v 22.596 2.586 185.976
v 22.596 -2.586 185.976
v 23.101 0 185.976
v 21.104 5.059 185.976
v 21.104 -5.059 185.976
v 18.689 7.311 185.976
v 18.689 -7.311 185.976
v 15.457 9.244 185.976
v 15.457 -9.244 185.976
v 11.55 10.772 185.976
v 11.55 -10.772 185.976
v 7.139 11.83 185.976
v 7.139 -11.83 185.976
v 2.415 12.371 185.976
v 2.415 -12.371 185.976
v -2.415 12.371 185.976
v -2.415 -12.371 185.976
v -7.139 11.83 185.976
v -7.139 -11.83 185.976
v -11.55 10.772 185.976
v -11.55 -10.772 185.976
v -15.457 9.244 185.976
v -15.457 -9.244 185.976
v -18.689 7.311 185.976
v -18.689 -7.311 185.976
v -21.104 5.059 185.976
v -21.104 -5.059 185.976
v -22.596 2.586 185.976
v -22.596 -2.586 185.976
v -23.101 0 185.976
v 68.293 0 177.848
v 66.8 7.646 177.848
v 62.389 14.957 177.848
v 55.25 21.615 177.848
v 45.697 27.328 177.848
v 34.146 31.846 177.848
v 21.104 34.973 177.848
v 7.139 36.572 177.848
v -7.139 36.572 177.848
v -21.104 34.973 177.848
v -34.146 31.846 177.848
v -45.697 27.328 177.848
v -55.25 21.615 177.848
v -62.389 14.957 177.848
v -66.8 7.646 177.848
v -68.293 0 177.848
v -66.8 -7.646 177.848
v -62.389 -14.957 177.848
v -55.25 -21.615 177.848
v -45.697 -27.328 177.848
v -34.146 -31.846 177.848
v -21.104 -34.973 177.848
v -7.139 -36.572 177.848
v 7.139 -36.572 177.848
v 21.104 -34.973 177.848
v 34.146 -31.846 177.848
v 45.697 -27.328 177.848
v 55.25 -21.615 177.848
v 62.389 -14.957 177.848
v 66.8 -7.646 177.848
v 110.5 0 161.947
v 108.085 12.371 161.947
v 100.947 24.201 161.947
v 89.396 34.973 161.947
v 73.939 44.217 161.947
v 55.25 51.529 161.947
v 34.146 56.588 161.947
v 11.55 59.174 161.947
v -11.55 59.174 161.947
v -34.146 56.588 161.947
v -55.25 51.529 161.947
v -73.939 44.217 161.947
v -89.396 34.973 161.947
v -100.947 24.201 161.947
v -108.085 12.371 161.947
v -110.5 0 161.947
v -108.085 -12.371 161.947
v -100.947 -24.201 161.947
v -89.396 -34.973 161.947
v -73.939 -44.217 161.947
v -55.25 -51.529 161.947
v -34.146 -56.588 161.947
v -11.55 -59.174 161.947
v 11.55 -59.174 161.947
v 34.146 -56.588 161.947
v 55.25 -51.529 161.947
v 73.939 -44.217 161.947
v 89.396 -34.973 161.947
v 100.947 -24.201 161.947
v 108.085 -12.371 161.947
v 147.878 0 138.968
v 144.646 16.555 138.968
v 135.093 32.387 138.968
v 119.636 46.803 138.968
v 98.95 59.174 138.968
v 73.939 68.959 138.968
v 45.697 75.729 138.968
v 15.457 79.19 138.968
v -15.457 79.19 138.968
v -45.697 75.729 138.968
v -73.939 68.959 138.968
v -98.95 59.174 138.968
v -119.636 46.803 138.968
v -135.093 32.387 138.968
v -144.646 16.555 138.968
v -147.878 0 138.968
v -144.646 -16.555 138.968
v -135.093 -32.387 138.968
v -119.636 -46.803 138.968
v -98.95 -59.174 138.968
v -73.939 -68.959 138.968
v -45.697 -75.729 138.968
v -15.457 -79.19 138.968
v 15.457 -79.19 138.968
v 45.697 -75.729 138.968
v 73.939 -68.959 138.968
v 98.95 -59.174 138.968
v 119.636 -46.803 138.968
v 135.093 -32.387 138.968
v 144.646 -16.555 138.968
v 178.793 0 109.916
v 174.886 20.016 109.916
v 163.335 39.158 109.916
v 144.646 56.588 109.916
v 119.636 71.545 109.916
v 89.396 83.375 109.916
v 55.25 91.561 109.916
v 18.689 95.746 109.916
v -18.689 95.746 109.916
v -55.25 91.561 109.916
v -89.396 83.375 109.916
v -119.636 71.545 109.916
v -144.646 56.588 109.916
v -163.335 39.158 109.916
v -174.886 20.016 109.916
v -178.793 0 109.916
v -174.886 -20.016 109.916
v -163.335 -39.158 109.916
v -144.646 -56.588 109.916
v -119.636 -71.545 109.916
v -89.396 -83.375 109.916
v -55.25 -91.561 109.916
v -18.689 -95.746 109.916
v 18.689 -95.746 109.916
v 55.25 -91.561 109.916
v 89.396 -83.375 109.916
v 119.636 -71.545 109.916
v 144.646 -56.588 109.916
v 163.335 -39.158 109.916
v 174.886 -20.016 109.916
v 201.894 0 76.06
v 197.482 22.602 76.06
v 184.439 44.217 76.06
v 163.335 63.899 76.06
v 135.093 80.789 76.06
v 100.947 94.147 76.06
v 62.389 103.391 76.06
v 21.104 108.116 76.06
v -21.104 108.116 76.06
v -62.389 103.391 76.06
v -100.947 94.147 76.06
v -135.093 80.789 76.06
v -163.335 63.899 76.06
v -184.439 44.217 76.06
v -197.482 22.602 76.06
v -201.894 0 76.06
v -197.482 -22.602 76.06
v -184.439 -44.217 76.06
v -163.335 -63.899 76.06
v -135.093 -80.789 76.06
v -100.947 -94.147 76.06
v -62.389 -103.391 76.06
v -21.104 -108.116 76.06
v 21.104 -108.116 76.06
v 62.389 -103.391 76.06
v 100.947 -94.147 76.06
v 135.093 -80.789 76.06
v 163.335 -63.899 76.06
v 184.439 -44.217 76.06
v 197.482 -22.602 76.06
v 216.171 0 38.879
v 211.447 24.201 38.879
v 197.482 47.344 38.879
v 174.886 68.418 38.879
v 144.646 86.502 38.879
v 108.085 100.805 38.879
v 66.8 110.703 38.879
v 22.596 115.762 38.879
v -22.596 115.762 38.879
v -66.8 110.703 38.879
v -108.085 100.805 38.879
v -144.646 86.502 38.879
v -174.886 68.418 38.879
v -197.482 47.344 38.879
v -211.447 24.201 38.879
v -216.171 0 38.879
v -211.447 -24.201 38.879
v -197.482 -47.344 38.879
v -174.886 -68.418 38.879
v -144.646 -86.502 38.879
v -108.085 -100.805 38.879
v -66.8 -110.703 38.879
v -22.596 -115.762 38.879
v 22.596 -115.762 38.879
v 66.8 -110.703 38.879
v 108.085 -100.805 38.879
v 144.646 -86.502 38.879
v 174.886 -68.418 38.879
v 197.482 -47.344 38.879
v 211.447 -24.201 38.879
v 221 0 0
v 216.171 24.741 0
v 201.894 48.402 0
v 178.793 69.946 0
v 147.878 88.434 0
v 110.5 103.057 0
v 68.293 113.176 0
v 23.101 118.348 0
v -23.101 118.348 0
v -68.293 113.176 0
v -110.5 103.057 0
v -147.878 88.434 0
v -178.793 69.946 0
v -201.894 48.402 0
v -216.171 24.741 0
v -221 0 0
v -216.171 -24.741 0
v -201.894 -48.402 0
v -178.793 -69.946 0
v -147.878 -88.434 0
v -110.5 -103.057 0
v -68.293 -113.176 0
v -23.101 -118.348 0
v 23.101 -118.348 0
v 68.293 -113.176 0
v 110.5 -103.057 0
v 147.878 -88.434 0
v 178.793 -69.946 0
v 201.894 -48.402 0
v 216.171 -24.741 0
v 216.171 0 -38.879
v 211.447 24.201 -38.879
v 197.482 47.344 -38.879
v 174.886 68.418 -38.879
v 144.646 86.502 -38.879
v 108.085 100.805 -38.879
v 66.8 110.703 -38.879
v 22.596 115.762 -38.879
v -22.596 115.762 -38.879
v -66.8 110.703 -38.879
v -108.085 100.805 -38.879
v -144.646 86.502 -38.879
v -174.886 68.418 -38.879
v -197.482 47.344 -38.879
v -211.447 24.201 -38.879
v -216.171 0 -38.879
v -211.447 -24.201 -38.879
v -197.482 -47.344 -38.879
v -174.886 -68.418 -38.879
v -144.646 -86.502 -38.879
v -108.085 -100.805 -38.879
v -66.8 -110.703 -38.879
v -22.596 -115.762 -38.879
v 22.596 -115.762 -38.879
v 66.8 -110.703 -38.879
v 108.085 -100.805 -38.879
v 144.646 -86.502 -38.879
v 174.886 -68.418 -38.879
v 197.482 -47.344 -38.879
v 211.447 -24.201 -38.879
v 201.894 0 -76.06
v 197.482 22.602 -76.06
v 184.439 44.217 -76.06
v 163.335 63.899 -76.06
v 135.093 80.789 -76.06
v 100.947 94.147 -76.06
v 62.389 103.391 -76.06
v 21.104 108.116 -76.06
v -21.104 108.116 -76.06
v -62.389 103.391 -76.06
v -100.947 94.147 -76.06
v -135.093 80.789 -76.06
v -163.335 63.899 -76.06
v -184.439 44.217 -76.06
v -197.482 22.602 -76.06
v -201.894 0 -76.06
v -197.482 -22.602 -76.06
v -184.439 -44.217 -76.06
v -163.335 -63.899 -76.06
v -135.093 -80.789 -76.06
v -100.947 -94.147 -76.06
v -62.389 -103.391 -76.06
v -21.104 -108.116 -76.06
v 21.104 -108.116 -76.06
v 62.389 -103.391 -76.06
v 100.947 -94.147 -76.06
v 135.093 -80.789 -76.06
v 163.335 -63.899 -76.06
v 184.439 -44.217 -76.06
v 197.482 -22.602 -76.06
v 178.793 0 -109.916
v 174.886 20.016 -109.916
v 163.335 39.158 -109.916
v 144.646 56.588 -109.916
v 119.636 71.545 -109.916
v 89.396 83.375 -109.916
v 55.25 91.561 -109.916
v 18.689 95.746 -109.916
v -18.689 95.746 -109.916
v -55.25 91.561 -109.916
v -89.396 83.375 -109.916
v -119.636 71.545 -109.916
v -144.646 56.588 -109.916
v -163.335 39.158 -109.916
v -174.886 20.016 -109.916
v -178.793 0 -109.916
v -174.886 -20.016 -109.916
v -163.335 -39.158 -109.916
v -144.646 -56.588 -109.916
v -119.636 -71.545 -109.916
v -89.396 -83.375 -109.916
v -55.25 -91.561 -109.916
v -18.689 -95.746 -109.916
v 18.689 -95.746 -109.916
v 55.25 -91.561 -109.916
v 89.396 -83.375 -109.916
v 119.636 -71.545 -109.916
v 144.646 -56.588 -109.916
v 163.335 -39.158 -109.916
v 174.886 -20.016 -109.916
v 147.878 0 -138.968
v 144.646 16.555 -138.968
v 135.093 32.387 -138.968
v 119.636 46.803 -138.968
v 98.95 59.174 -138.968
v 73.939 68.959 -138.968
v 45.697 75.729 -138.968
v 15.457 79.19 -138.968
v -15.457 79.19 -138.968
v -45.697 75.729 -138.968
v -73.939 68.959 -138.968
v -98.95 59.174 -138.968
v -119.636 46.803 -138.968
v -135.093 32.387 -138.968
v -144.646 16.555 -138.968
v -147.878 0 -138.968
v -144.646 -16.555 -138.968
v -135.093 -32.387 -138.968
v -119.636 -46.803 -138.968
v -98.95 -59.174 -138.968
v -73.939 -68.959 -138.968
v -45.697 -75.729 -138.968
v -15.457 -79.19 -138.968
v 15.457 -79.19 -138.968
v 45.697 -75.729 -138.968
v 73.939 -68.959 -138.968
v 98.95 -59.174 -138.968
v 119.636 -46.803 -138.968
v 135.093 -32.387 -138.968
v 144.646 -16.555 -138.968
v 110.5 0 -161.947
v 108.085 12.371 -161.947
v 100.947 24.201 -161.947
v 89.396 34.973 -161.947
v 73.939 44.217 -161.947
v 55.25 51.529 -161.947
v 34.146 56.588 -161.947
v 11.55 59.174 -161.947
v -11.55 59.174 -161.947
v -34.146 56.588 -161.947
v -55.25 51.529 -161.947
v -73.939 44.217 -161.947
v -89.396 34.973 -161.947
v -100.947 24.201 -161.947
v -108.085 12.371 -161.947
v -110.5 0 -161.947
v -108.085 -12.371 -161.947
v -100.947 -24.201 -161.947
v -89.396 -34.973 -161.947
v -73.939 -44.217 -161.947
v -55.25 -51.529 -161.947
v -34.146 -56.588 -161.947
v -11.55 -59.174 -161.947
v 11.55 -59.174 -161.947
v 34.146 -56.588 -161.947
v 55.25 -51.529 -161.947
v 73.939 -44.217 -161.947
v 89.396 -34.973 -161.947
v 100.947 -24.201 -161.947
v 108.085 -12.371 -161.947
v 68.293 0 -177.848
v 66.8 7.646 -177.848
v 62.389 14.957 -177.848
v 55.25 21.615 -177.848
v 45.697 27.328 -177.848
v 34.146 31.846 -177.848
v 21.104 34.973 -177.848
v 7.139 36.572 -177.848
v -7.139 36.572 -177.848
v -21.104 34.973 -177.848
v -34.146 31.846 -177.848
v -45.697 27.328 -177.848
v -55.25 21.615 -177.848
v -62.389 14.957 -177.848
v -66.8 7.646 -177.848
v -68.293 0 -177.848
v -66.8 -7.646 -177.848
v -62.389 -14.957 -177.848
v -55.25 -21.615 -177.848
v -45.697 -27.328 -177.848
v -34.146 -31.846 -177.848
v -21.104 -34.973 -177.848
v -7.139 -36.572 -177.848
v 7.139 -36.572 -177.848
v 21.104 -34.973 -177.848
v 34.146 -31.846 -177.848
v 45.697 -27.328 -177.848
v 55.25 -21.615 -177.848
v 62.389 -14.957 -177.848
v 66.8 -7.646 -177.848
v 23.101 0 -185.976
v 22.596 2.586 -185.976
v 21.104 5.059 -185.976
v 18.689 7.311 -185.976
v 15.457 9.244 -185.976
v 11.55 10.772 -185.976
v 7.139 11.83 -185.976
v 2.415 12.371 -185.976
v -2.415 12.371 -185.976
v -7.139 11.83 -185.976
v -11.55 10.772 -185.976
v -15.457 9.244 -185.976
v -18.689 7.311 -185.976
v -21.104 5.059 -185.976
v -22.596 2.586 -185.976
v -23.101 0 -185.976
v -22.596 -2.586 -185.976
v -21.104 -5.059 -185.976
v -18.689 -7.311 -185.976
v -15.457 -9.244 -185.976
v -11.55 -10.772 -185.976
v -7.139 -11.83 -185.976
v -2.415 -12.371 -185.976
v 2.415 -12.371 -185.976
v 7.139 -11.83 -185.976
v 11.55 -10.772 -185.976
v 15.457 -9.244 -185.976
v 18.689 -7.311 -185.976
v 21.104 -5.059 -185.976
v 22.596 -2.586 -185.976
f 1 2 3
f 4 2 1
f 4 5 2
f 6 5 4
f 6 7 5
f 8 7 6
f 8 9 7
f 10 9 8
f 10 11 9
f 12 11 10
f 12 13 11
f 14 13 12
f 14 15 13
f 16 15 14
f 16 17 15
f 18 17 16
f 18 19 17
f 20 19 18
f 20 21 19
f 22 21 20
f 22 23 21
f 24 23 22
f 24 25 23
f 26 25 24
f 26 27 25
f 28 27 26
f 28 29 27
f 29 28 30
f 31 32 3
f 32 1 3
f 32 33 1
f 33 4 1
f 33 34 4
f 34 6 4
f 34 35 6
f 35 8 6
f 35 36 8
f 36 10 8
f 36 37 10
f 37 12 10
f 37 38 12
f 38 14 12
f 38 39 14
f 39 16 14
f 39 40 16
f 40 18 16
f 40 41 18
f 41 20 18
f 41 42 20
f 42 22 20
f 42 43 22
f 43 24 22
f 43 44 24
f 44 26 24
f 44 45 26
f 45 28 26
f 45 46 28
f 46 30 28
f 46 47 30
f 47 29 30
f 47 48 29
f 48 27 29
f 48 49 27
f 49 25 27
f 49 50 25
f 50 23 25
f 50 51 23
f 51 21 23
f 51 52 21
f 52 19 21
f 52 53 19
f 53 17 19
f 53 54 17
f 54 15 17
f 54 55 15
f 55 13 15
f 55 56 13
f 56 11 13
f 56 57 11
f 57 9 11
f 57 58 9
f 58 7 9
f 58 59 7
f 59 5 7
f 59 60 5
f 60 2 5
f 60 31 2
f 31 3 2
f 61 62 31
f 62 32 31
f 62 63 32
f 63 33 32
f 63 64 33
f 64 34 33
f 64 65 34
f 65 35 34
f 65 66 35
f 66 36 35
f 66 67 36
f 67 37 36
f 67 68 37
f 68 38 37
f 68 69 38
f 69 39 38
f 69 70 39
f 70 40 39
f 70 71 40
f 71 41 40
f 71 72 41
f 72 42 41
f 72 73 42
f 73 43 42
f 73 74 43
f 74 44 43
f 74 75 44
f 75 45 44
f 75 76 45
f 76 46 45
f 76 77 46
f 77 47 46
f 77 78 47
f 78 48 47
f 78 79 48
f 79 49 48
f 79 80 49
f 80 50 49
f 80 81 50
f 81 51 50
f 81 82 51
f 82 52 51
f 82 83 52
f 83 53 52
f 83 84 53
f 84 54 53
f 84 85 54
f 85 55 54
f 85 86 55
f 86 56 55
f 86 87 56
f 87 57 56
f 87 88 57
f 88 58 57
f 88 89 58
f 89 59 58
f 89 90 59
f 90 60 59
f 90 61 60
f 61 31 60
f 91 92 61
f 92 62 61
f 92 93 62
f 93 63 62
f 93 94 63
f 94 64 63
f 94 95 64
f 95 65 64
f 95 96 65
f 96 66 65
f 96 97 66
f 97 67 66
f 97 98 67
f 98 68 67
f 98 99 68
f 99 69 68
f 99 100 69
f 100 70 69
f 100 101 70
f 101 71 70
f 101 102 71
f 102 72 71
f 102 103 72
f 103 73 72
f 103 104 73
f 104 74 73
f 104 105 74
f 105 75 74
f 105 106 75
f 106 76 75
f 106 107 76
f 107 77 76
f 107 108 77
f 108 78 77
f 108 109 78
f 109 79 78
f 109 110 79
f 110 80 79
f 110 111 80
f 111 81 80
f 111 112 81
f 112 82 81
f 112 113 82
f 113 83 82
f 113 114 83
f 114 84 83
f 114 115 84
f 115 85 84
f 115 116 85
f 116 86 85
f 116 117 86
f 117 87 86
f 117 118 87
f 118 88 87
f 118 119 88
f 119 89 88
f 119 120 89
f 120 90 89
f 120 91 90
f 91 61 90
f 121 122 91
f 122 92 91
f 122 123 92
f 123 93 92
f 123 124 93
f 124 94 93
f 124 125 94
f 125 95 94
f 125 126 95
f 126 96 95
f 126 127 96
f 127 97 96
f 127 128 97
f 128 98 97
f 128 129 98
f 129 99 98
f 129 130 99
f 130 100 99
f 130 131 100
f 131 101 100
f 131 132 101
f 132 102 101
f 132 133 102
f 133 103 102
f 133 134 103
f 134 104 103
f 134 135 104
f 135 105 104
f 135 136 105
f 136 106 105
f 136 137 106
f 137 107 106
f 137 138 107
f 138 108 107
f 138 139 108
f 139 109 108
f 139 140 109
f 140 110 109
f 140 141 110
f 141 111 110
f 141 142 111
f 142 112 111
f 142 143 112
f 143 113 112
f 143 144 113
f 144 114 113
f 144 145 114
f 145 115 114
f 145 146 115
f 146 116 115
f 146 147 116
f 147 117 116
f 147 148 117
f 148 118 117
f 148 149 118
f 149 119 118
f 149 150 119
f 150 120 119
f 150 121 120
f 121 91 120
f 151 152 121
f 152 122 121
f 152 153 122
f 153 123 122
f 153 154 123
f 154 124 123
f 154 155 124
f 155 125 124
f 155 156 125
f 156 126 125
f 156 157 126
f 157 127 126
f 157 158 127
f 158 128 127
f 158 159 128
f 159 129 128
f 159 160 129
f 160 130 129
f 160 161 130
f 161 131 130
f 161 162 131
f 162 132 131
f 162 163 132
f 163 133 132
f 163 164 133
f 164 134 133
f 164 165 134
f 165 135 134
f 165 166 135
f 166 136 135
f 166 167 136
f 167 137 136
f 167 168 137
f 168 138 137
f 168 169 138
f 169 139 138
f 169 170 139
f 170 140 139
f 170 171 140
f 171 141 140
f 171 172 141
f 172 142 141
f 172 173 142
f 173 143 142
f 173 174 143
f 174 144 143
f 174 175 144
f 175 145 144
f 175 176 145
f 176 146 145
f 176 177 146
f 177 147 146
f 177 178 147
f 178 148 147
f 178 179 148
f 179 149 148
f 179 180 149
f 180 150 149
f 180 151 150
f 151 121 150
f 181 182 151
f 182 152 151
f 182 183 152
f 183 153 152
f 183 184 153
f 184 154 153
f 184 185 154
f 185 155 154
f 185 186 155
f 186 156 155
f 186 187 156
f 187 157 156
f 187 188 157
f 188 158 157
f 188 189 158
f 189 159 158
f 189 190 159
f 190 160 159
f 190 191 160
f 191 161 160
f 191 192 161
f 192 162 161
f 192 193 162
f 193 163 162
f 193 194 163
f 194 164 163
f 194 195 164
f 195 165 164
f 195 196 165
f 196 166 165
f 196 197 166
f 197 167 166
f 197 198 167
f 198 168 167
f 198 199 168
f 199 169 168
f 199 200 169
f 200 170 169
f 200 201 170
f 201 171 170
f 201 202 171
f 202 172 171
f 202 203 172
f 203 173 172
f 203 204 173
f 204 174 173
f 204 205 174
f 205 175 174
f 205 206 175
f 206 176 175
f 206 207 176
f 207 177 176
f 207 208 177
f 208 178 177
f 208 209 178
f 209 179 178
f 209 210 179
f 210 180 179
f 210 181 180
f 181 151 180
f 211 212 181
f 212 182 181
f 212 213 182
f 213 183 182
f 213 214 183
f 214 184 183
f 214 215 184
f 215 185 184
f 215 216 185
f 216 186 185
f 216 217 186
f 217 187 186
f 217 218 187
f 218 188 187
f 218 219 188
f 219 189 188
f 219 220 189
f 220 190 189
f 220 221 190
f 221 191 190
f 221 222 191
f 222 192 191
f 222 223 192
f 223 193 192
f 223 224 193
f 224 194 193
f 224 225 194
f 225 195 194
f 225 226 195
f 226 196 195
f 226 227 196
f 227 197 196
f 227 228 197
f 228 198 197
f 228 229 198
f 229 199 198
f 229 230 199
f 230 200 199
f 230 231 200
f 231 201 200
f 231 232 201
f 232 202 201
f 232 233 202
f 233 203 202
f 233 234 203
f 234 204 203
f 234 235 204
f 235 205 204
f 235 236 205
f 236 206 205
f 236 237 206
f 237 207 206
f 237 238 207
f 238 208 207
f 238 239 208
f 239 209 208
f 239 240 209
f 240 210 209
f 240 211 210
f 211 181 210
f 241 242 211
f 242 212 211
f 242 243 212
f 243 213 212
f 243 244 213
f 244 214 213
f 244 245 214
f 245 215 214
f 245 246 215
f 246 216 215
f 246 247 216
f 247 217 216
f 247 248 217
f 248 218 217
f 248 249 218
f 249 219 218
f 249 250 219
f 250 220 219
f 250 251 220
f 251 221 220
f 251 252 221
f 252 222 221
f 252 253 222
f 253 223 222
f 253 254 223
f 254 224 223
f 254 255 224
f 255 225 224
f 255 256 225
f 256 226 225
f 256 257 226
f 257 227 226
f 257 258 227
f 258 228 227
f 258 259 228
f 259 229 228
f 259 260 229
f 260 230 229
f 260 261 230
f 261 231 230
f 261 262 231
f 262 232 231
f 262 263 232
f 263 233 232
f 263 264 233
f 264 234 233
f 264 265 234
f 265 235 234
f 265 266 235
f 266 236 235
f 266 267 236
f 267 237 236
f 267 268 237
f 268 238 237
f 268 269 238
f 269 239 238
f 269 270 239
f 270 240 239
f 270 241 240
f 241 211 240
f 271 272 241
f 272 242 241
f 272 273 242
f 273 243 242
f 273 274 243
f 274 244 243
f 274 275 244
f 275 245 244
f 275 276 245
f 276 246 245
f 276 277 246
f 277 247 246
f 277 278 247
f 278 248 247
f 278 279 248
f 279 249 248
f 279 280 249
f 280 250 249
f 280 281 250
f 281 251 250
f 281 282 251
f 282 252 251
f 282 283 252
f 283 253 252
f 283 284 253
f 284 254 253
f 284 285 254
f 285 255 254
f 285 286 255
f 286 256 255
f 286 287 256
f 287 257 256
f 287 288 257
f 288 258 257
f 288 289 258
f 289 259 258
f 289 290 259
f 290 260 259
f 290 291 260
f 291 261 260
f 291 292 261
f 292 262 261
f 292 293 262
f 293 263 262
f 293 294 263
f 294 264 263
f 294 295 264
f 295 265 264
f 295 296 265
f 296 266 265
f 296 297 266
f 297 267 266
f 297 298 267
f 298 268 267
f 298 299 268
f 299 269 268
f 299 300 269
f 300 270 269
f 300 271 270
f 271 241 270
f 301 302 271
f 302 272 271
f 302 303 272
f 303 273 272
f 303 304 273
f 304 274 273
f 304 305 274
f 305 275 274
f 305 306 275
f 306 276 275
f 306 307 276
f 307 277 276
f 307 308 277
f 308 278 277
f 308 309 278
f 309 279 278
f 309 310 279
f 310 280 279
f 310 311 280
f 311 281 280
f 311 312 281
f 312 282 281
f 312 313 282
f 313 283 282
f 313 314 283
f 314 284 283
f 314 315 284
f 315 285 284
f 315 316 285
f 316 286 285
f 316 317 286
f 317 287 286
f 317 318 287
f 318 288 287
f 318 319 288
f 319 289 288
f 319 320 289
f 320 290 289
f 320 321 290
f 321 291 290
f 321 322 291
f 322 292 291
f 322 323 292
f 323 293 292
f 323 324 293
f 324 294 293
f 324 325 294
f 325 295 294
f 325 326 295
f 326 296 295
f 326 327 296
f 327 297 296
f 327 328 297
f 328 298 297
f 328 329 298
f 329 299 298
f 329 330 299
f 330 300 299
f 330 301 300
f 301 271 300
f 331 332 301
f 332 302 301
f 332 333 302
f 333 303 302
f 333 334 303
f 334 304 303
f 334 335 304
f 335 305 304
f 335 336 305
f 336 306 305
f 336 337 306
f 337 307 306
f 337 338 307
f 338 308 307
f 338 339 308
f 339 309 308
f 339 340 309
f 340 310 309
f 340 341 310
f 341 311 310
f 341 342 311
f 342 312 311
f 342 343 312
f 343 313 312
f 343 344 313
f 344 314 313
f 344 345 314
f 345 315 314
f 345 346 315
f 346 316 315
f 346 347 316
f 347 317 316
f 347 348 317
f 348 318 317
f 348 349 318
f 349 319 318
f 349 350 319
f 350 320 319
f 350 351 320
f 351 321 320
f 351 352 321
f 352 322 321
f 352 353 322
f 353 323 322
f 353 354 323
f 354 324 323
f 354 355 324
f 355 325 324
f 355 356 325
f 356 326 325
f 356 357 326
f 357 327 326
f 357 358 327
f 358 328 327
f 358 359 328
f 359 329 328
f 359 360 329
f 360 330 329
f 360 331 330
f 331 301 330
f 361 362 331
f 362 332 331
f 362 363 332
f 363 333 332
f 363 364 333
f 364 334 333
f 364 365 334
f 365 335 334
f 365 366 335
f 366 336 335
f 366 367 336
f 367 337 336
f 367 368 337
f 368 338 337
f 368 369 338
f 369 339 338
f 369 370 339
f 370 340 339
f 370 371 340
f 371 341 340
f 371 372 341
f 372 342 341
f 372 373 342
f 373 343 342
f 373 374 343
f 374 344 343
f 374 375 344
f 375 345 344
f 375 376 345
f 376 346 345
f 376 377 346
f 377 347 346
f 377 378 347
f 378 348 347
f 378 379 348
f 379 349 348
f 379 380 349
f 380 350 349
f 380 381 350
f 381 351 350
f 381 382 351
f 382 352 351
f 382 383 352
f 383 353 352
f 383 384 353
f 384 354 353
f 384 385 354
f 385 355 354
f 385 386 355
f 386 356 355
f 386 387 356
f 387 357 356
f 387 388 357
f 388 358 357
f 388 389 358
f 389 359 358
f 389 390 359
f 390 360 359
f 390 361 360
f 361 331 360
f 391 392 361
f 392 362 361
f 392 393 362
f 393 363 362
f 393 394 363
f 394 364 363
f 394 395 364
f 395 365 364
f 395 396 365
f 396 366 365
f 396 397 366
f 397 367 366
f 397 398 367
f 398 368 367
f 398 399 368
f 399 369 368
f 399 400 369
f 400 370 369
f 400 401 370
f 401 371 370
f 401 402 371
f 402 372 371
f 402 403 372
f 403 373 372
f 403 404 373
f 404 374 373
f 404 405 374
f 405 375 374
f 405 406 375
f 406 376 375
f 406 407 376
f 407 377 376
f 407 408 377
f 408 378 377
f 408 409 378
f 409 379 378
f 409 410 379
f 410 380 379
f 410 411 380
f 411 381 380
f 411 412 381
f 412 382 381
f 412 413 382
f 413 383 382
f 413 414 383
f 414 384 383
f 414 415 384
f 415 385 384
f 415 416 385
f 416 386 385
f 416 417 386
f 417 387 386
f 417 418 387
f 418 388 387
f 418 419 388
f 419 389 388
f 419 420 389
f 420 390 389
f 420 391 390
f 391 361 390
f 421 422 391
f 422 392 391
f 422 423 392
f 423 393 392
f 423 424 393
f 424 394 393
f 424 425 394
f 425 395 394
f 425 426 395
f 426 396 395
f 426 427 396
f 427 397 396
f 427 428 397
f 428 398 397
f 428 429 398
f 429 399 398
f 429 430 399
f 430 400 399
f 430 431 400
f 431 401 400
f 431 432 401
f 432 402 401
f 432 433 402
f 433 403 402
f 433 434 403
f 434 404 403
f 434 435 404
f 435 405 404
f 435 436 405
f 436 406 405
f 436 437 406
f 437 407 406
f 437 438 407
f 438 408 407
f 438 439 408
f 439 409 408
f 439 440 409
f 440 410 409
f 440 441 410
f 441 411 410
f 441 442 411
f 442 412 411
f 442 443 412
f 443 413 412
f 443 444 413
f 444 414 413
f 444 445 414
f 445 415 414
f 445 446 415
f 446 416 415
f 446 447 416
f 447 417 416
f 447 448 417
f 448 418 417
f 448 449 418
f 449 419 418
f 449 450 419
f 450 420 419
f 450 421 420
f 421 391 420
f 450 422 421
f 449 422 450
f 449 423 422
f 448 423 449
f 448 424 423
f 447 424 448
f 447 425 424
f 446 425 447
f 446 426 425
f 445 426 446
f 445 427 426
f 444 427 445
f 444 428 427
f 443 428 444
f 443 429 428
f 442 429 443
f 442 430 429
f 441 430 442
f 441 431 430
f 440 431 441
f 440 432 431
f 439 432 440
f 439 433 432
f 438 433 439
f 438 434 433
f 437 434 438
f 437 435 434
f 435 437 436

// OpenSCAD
// Generated by SolidPython 1.0.1 on 2020-07-29 00:46:50


scale(v = [13, 7, 11]) {
	sphere(r = 17);
}
/***********************************************
*********      SolidPython code:      **********
************************************************
 
# import packages: SolidPython
from solid import *
from solid.utils import *
from itertools import chain, combinations, permutations


class Resize:

    def __init__(self, scad_file):
        self.scad_file = scad_file
        #self.scad_file = import_scad(scad_file)
        # cone/cylinder param:
        self.r1 = 0
        self.r2 = 0
        self.h = 0
        # rectangular prism param:
        self.w = 0
        self.l = 0
        # ellipse param:
        self.r = 0

    # import OpenScad code (file name corresponds to shape)


    # classify shape + parameters
    def assign(self, param1, param2, param3):
        if self.scad_file == 'cone.scad':
            self.r1 = param1
            self.r2 = param2
            self.h = param3
        elif self.scad_file == 'cylinder.scad':
            self.r1 = param1
            self.r2 = param2
            self.h = param3
        elif self.scad_file == 'rectangularPrism.scad':
            self.h = param1
            self.l = param2
            self.w = param3
        else:
            self.r = param1
            self.h = param2

    # resize parameters
    def iterate(self):
        x = range(3, 20, 2)
        i = 1
        if self.scad_file == 'cone.scad':
            tempList = list(permutations(x, 2))
            for temp in tempList:
                param1 = temp[0]
                param2 = temp[1]
                filepath = 'produced_scad_files/' + 'cone' + str(param1) + '_' + str(param2) + '_' + '.scad'
                scad_render_to_file(cylinder(h=param1, r1=param2, r2=0), filepath)

        elif self.scad_file == 'cylinder.scad':
            tempList = list(permutations(x, 3))
            for temp in tempList:
                param1 = temp[0]
                param2 = temp[1]
                filepath = 'produced_scad_files/' + 'cylinder' + str(param1) + '_' + str(param2) + '_' + '.scad'
                scad_render_to_file(cylinder(h=param1, r1=param2, r2=param2), filepath)

        elif self.scad_file == 'rectangularPrism.scad':
            tempList = list(permutations(x, 3))
            for temp in tempList:
                param1 = temp[0]
                param2 = temp[1]
                param3 = temp[2]
                filepath = 'produced_scad_files/' + 'rectangularPrism' + str(param1) + '_' + str(param2) + '_' + str(
                    param3) + '.scad'
                scad_render_to_file(cube(size=(param1, param2, param3)), filepath)

        elif self.scad_file == 'ellipse.scad':
            tempList = list(permutations(x, 4))
            for temp in tempList:
                param1 = temp[0]
                param2 = temp[1]
                param3 = temp[2]
                param4 = temp[3]
                filepath = 'produced_scad_files/' + 'ellipse' + str(param1) + '_' + str(param2) + '_' + str(param3) + '_' + str(param4) + '.scad'
                scad_render_to_file(scale([param1, param2, param3])(sphere(r=param4)), filepath)

    def render_to_scadfile(self):
        scad_render_to_file(scad, 'example.scad') 
 
************************************************/
